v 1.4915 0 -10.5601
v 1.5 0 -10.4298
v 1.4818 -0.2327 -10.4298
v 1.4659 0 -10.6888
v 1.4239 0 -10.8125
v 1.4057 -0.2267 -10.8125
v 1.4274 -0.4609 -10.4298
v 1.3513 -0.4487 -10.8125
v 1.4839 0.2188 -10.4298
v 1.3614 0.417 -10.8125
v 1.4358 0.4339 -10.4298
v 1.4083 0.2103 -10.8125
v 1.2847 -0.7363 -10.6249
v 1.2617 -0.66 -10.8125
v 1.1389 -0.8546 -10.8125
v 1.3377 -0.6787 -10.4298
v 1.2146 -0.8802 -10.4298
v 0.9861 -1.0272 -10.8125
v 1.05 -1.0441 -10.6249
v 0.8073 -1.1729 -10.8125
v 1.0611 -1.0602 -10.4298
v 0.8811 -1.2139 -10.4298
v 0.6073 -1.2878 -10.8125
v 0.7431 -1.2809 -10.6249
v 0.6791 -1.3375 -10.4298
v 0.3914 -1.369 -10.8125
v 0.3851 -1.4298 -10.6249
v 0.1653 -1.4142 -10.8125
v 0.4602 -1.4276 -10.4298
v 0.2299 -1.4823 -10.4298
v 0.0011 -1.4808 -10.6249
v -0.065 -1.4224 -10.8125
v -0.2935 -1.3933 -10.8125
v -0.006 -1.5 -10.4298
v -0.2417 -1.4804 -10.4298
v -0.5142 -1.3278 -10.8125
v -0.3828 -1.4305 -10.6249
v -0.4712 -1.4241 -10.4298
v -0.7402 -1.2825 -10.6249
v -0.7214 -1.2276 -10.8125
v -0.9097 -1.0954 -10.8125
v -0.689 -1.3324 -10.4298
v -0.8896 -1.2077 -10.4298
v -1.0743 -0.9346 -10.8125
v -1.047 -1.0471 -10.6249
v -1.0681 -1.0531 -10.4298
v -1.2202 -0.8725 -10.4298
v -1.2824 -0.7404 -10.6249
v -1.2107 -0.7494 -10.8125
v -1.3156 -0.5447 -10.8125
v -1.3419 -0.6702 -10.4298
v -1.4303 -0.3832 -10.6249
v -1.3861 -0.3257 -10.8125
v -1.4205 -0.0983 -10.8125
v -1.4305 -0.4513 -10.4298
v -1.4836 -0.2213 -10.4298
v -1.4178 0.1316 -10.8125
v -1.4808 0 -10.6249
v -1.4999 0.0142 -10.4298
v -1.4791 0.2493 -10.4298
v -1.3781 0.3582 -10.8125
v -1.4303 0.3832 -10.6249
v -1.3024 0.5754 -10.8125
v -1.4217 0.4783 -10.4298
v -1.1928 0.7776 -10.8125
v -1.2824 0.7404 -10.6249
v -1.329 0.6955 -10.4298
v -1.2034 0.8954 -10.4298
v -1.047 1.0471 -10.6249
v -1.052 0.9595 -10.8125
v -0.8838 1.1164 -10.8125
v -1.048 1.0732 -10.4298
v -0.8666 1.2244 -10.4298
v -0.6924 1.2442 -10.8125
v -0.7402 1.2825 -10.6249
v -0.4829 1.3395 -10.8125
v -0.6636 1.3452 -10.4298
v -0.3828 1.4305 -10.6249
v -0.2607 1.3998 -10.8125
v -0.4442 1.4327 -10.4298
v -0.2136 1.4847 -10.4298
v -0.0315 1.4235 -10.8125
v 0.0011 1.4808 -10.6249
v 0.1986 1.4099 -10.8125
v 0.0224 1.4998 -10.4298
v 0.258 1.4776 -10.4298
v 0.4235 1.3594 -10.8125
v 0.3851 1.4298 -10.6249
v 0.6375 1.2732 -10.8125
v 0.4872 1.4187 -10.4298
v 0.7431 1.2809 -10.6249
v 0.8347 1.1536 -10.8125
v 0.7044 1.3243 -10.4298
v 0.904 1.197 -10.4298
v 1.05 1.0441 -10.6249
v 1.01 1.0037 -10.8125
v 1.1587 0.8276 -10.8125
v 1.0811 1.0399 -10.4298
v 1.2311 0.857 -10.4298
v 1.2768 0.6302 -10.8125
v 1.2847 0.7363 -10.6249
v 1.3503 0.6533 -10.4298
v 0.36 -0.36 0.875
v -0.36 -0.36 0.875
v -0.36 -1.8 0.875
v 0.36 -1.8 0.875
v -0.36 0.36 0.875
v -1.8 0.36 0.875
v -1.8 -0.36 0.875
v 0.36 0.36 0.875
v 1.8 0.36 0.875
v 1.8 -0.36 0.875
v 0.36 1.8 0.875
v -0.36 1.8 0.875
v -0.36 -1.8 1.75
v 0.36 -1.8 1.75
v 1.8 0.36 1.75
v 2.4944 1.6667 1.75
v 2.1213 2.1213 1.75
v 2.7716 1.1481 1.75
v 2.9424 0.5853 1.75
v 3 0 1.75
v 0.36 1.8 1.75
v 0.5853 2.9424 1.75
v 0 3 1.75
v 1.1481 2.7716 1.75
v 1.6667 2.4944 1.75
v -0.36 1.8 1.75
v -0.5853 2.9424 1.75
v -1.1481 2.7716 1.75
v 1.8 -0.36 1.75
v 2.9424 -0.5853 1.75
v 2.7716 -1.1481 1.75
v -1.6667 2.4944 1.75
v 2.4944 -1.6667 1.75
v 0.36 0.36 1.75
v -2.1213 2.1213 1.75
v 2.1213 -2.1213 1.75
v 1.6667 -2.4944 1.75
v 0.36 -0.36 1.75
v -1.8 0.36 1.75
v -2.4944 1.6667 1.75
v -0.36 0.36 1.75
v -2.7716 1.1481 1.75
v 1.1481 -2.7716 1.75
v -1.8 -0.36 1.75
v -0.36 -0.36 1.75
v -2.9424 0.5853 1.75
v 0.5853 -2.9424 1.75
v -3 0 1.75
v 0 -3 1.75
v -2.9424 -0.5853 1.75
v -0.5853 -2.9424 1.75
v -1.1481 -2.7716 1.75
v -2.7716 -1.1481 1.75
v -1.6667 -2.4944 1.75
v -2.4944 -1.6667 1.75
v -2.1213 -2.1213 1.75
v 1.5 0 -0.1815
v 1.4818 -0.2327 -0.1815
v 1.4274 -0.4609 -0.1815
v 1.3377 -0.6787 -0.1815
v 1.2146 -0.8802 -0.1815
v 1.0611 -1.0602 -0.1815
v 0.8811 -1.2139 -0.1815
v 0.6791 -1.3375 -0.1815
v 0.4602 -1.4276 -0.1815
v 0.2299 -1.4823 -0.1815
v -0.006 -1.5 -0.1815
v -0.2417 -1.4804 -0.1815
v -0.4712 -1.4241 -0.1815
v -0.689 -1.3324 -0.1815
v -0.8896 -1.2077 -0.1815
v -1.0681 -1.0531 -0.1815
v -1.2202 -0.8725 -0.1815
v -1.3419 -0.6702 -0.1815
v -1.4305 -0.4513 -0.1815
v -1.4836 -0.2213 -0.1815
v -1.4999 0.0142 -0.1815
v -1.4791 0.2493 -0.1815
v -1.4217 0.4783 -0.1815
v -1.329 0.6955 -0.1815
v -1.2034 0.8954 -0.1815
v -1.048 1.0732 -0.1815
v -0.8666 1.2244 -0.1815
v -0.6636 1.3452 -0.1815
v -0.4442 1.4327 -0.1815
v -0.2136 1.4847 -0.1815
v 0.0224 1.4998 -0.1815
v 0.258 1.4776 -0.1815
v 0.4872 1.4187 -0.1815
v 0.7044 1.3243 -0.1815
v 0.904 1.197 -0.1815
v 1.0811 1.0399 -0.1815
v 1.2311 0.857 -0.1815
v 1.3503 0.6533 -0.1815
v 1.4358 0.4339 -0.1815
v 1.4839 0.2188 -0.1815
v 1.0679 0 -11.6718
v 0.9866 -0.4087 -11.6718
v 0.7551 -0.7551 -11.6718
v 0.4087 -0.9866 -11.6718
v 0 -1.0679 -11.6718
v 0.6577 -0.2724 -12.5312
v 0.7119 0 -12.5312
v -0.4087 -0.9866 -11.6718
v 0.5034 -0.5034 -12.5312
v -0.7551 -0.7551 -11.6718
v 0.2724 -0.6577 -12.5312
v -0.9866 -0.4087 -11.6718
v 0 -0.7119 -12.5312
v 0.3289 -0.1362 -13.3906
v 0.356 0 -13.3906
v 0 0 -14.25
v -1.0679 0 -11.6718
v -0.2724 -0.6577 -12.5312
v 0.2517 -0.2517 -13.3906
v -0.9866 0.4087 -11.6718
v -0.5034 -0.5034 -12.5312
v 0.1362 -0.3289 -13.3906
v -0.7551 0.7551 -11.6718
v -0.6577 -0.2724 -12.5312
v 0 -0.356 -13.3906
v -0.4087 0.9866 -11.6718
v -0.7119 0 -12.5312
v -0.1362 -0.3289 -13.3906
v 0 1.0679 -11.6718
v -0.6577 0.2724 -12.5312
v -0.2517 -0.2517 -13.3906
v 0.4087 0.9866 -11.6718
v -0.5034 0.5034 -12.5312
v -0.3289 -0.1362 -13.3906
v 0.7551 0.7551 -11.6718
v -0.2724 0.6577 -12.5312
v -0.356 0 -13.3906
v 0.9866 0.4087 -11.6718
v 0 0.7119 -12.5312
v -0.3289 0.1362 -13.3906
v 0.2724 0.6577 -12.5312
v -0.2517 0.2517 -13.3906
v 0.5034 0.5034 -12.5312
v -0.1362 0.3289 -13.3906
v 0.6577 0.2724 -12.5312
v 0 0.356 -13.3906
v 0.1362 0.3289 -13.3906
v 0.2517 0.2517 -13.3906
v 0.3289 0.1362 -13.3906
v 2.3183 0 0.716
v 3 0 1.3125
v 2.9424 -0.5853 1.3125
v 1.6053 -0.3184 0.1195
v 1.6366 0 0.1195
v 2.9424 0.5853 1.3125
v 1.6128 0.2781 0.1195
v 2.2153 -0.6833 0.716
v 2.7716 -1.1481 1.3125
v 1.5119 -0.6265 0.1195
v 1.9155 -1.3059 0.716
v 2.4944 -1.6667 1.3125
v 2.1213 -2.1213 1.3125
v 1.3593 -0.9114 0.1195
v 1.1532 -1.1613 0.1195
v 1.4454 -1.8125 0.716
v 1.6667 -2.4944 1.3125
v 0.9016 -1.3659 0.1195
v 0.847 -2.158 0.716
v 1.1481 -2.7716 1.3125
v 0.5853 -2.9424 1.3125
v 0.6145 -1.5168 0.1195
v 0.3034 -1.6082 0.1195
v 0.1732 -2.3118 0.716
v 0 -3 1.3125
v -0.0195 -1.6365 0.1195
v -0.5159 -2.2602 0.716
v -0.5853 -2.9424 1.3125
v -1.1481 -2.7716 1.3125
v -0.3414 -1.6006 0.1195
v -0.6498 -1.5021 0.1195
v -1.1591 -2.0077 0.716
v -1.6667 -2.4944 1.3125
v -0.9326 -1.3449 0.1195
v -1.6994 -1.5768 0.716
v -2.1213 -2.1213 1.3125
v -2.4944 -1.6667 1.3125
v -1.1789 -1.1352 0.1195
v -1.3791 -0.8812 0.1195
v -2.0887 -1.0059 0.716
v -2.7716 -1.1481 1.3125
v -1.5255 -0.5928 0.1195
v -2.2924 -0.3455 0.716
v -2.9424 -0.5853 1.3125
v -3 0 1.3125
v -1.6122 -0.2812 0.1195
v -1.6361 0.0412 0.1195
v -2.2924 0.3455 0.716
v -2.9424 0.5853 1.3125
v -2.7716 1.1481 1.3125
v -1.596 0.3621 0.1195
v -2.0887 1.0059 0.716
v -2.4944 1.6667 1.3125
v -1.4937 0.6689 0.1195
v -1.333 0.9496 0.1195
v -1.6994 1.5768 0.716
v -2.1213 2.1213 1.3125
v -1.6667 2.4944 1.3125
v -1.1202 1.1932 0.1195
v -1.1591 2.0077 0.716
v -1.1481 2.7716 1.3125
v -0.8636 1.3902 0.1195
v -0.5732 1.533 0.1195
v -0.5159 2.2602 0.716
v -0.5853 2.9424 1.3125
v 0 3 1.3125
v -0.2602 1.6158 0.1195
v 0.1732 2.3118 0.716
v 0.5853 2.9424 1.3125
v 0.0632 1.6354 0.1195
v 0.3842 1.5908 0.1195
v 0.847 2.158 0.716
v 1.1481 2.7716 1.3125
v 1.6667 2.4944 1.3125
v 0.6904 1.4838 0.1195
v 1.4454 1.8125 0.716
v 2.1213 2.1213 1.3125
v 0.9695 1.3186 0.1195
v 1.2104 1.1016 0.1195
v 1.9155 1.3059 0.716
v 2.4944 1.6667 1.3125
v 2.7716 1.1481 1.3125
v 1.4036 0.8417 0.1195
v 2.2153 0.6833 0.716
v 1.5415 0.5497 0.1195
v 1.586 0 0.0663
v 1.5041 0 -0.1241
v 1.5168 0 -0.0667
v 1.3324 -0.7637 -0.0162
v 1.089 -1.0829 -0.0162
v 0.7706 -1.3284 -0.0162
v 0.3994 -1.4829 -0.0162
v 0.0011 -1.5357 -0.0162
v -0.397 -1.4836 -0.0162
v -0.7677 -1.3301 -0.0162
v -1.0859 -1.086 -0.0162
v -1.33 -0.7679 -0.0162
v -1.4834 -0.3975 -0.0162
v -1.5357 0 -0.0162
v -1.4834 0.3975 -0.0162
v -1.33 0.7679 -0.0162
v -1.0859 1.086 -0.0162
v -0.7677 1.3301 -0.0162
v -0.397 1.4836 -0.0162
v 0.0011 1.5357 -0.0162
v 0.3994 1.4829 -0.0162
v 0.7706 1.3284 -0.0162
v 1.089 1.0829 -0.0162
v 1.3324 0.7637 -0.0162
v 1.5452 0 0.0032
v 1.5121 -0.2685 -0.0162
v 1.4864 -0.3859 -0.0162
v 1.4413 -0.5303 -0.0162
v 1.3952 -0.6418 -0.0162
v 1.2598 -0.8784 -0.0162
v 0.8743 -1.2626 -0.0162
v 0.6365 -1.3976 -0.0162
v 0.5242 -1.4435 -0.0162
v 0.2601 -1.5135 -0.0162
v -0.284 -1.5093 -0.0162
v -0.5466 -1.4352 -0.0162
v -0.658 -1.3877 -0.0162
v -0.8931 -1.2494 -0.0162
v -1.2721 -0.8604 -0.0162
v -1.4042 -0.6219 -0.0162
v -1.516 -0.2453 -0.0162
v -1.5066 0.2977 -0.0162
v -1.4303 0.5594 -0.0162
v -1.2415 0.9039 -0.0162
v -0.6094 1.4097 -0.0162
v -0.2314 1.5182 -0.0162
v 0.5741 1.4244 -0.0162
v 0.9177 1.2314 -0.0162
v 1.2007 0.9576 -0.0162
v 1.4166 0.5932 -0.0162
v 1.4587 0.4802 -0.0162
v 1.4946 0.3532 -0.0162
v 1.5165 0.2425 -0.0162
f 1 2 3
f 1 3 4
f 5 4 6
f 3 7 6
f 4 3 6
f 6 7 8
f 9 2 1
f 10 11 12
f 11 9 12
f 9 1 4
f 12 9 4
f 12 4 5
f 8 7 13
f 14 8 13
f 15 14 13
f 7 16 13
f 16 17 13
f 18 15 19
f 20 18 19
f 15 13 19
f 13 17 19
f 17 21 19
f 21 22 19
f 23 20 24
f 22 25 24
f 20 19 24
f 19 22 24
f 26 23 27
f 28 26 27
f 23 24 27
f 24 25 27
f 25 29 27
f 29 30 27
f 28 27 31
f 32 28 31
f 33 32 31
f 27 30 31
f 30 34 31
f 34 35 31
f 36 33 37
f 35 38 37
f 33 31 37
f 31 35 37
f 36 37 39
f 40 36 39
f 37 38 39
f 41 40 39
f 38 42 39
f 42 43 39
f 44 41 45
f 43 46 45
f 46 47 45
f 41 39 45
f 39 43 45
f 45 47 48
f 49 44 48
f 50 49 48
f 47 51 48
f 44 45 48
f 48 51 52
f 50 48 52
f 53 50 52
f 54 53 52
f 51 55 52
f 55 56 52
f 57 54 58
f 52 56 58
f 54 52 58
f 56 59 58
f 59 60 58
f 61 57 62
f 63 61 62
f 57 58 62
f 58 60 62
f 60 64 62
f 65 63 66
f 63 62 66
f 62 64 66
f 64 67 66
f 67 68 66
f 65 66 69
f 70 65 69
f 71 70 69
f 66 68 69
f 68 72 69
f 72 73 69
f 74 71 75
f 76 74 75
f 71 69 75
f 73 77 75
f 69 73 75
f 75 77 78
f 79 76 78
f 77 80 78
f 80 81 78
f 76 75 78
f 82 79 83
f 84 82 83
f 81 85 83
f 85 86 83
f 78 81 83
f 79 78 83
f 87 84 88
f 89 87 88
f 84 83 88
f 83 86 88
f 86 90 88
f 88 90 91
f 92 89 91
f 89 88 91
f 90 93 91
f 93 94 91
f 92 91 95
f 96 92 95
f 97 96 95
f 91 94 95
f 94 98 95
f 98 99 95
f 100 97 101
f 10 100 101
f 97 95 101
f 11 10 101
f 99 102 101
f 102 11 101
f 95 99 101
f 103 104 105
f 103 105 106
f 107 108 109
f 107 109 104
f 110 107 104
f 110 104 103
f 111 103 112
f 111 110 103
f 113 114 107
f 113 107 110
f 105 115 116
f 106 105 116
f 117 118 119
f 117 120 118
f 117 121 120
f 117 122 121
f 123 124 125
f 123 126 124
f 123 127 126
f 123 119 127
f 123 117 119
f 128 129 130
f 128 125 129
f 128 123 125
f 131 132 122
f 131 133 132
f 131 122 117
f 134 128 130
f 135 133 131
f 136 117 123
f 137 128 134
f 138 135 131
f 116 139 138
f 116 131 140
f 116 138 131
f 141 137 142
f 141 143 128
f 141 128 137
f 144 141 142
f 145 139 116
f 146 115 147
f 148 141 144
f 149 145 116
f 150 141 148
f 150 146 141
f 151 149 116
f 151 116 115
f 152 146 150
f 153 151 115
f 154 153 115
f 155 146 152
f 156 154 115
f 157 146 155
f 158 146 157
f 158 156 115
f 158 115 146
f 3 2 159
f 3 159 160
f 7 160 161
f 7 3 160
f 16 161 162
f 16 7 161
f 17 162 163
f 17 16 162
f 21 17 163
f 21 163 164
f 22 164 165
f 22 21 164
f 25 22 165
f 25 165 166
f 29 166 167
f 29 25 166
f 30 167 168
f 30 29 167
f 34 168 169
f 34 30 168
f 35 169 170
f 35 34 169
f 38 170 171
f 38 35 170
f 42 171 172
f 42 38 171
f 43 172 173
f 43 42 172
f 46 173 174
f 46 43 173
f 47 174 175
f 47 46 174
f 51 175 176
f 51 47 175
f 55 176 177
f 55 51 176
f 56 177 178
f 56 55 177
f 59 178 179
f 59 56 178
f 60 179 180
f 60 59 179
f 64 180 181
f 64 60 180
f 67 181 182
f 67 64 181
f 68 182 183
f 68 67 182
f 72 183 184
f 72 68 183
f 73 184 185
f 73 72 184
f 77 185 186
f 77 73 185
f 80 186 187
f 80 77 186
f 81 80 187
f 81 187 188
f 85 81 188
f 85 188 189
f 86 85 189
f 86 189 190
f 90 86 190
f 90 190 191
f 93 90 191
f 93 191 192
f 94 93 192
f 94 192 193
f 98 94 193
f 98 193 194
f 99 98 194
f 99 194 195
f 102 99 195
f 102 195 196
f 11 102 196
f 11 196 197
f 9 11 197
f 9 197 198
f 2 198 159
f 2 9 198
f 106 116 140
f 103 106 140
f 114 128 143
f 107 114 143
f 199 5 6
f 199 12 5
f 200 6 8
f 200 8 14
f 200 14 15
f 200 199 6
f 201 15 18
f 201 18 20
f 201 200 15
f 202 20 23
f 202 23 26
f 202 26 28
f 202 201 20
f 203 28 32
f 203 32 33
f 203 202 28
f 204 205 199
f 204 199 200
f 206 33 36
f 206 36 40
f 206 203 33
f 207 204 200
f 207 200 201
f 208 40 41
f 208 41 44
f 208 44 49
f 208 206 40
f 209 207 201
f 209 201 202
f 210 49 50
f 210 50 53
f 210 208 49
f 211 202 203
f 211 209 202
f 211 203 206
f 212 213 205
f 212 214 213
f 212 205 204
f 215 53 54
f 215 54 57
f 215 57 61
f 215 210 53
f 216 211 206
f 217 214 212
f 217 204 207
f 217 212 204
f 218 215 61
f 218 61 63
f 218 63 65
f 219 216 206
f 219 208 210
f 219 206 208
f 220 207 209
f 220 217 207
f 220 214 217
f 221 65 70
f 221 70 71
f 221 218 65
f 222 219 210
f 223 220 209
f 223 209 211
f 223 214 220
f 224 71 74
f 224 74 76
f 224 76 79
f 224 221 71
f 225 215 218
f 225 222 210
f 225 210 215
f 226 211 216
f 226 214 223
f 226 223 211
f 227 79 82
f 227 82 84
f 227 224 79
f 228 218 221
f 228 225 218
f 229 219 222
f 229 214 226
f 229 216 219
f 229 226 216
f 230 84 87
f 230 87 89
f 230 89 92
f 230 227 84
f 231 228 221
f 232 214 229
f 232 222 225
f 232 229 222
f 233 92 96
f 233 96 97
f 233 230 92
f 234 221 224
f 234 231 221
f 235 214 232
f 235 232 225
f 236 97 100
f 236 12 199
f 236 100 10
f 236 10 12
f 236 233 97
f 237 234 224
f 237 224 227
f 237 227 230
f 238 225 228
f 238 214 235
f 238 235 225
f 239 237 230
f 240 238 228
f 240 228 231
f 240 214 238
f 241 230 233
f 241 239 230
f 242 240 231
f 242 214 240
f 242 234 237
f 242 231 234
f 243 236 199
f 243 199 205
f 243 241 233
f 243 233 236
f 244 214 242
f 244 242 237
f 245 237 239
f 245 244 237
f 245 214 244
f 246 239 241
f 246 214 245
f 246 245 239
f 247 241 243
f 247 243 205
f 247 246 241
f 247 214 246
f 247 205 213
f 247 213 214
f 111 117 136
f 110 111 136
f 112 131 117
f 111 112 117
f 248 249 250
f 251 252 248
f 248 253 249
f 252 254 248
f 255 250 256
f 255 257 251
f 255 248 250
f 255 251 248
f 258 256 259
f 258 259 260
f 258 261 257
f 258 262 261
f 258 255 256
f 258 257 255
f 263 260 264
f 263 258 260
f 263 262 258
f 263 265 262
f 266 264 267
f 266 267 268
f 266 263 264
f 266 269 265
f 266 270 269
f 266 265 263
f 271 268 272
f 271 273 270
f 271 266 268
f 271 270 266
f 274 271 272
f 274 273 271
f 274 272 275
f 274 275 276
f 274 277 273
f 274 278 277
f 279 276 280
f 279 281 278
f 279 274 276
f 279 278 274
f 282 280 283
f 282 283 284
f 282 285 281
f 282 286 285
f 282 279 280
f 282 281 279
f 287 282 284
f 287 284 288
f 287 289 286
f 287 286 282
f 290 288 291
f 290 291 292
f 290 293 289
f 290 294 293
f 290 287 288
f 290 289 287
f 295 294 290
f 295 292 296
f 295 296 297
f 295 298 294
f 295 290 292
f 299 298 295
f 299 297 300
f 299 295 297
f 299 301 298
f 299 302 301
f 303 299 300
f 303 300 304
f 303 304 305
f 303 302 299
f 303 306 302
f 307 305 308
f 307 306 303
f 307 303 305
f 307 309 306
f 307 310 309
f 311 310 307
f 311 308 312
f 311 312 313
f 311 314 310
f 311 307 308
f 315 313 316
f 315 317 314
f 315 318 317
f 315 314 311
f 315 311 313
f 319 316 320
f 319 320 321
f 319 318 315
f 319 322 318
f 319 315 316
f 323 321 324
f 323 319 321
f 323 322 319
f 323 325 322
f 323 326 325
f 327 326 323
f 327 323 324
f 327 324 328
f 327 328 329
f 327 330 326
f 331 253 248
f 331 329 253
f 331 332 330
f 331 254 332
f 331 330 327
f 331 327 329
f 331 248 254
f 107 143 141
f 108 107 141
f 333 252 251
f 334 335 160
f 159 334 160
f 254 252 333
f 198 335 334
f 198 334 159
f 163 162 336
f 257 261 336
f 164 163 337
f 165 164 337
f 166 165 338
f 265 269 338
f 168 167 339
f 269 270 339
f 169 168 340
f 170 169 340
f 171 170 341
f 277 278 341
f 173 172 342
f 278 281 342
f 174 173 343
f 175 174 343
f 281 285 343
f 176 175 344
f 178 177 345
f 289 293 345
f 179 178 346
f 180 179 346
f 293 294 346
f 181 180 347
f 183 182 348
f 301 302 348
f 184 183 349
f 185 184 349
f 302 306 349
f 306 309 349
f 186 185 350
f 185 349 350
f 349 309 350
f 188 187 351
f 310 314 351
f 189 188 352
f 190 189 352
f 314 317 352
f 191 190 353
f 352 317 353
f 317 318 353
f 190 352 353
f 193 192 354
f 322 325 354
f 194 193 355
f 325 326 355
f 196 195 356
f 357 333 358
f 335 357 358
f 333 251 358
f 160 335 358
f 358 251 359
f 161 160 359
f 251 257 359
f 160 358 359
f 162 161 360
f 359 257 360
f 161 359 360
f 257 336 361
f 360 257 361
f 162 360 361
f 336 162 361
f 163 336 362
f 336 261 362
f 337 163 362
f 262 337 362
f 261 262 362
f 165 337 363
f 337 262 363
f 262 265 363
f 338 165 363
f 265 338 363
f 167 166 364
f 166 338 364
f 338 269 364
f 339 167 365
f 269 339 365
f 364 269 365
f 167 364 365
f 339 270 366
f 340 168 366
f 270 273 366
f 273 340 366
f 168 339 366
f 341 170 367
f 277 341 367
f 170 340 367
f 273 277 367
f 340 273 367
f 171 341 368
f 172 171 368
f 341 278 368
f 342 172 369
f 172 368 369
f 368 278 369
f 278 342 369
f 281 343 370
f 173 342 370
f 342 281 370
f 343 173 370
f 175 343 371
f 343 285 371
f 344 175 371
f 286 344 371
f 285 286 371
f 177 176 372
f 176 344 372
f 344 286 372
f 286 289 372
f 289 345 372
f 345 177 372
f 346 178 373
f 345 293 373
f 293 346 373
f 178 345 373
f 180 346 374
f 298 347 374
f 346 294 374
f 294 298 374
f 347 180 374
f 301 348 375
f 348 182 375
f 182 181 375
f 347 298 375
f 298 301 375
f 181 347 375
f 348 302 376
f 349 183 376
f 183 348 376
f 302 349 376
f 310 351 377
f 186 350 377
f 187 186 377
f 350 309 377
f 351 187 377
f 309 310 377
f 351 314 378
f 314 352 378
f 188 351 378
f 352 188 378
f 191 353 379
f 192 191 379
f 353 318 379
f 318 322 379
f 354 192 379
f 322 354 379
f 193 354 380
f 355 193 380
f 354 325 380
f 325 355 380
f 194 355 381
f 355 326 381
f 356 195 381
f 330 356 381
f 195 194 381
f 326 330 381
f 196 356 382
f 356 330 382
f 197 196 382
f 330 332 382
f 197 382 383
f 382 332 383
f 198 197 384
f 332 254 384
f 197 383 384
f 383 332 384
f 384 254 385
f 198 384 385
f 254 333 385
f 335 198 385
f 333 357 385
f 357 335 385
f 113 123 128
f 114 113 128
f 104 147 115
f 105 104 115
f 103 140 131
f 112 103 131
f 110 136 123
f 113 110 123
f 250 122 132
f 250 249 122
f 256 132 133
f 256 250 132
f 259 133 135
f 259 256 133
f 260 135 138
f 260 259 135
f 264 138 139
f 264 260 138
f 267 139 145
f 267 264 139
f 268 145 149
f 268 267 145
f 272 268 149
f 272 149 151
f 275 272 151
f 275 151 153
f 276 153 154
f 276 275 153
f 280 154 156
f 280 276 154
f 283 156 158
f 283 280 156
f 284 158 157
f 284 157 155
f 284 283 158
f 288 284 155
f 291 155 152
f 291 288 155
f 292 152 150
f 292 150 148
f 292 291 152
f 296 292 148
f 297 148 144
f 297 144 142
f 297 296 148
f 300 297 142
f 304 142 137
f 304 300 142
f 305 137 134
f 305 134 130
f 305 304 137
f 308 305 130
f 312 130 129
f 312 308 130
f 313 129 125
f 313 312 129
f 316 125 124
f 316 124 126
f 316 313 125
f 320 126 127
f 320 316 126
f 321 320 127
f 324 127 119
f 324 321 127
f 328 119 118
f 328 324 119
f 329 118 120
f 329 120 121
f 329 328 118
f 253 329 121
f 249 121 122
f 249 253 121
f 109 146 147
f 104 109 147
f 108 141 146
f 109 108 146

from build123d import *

# Parameters (mm, degrees)
CUT_EXTRUDE1_DEPTH = 0.875
FILLET1_R          = 0.4
FILLET2_R          = 1


with BuildPart() as part:
    # Sketch1 → Revolve1 (revolve)
    with BuildSketch(Plane(origin=(0, 0, 0), x_dir=(0, 0, -1), z_dir=(1, 0, 0)), mode=Mode.PRIVATE) as revolve1_sk:
        Polygon((-1.3125, 3), (0, 1.5), (10.628679656, 1.5), (14.25, 0), (-1.75, 0), (-1.75, 3), align=None)
    revolve(revolve1_sk.sketch.rotate(Axis((0, 0, 94.243212435), (0, 0, -1)), 90), axis=Axis((0, 0, 94.243212435), (0, 0, -1)))

    # Sketch5 → Cut-Extrude1 (cut)
    with BuildSketch(Plane.XY.offset(1.75)):
        Polygon((0, 1.8), (-0.36, 1.8), (-0.36, 0.36), (-1.8, 0.36), (-1.8, 0), (-1.8, -0.36), (-0.36, -0.36), (-0.36, -1.8), (0, -1.8), (0.36, -1.8), (0.36, -0.36), (1.8, -0.36), (1.8, 0), (1.8, 0.36), (0.36, 0.36), (0.36, 1.8), align=None)
    extrude(amount=-CUT_EXTRUDE1_DEPTH, mode=Mode.SUBTRACT)

    # Fillet1
    fillet1_edges = [part.edges().sort_by_distance(p)[0] for p in [
        (-1.5, 0, 0),
    ]]
    fillet(fillet1_edges, radius=FILLET1_R)

    # Fillet2
    fillet2_edges = [part.edges().sort_by_distance(p)[0] for p in [
        (-1.5, 0, -10.628679656),
    ]]
    fillet(fillet2_edges, radius=FILLET2_R)


solid = part.part
